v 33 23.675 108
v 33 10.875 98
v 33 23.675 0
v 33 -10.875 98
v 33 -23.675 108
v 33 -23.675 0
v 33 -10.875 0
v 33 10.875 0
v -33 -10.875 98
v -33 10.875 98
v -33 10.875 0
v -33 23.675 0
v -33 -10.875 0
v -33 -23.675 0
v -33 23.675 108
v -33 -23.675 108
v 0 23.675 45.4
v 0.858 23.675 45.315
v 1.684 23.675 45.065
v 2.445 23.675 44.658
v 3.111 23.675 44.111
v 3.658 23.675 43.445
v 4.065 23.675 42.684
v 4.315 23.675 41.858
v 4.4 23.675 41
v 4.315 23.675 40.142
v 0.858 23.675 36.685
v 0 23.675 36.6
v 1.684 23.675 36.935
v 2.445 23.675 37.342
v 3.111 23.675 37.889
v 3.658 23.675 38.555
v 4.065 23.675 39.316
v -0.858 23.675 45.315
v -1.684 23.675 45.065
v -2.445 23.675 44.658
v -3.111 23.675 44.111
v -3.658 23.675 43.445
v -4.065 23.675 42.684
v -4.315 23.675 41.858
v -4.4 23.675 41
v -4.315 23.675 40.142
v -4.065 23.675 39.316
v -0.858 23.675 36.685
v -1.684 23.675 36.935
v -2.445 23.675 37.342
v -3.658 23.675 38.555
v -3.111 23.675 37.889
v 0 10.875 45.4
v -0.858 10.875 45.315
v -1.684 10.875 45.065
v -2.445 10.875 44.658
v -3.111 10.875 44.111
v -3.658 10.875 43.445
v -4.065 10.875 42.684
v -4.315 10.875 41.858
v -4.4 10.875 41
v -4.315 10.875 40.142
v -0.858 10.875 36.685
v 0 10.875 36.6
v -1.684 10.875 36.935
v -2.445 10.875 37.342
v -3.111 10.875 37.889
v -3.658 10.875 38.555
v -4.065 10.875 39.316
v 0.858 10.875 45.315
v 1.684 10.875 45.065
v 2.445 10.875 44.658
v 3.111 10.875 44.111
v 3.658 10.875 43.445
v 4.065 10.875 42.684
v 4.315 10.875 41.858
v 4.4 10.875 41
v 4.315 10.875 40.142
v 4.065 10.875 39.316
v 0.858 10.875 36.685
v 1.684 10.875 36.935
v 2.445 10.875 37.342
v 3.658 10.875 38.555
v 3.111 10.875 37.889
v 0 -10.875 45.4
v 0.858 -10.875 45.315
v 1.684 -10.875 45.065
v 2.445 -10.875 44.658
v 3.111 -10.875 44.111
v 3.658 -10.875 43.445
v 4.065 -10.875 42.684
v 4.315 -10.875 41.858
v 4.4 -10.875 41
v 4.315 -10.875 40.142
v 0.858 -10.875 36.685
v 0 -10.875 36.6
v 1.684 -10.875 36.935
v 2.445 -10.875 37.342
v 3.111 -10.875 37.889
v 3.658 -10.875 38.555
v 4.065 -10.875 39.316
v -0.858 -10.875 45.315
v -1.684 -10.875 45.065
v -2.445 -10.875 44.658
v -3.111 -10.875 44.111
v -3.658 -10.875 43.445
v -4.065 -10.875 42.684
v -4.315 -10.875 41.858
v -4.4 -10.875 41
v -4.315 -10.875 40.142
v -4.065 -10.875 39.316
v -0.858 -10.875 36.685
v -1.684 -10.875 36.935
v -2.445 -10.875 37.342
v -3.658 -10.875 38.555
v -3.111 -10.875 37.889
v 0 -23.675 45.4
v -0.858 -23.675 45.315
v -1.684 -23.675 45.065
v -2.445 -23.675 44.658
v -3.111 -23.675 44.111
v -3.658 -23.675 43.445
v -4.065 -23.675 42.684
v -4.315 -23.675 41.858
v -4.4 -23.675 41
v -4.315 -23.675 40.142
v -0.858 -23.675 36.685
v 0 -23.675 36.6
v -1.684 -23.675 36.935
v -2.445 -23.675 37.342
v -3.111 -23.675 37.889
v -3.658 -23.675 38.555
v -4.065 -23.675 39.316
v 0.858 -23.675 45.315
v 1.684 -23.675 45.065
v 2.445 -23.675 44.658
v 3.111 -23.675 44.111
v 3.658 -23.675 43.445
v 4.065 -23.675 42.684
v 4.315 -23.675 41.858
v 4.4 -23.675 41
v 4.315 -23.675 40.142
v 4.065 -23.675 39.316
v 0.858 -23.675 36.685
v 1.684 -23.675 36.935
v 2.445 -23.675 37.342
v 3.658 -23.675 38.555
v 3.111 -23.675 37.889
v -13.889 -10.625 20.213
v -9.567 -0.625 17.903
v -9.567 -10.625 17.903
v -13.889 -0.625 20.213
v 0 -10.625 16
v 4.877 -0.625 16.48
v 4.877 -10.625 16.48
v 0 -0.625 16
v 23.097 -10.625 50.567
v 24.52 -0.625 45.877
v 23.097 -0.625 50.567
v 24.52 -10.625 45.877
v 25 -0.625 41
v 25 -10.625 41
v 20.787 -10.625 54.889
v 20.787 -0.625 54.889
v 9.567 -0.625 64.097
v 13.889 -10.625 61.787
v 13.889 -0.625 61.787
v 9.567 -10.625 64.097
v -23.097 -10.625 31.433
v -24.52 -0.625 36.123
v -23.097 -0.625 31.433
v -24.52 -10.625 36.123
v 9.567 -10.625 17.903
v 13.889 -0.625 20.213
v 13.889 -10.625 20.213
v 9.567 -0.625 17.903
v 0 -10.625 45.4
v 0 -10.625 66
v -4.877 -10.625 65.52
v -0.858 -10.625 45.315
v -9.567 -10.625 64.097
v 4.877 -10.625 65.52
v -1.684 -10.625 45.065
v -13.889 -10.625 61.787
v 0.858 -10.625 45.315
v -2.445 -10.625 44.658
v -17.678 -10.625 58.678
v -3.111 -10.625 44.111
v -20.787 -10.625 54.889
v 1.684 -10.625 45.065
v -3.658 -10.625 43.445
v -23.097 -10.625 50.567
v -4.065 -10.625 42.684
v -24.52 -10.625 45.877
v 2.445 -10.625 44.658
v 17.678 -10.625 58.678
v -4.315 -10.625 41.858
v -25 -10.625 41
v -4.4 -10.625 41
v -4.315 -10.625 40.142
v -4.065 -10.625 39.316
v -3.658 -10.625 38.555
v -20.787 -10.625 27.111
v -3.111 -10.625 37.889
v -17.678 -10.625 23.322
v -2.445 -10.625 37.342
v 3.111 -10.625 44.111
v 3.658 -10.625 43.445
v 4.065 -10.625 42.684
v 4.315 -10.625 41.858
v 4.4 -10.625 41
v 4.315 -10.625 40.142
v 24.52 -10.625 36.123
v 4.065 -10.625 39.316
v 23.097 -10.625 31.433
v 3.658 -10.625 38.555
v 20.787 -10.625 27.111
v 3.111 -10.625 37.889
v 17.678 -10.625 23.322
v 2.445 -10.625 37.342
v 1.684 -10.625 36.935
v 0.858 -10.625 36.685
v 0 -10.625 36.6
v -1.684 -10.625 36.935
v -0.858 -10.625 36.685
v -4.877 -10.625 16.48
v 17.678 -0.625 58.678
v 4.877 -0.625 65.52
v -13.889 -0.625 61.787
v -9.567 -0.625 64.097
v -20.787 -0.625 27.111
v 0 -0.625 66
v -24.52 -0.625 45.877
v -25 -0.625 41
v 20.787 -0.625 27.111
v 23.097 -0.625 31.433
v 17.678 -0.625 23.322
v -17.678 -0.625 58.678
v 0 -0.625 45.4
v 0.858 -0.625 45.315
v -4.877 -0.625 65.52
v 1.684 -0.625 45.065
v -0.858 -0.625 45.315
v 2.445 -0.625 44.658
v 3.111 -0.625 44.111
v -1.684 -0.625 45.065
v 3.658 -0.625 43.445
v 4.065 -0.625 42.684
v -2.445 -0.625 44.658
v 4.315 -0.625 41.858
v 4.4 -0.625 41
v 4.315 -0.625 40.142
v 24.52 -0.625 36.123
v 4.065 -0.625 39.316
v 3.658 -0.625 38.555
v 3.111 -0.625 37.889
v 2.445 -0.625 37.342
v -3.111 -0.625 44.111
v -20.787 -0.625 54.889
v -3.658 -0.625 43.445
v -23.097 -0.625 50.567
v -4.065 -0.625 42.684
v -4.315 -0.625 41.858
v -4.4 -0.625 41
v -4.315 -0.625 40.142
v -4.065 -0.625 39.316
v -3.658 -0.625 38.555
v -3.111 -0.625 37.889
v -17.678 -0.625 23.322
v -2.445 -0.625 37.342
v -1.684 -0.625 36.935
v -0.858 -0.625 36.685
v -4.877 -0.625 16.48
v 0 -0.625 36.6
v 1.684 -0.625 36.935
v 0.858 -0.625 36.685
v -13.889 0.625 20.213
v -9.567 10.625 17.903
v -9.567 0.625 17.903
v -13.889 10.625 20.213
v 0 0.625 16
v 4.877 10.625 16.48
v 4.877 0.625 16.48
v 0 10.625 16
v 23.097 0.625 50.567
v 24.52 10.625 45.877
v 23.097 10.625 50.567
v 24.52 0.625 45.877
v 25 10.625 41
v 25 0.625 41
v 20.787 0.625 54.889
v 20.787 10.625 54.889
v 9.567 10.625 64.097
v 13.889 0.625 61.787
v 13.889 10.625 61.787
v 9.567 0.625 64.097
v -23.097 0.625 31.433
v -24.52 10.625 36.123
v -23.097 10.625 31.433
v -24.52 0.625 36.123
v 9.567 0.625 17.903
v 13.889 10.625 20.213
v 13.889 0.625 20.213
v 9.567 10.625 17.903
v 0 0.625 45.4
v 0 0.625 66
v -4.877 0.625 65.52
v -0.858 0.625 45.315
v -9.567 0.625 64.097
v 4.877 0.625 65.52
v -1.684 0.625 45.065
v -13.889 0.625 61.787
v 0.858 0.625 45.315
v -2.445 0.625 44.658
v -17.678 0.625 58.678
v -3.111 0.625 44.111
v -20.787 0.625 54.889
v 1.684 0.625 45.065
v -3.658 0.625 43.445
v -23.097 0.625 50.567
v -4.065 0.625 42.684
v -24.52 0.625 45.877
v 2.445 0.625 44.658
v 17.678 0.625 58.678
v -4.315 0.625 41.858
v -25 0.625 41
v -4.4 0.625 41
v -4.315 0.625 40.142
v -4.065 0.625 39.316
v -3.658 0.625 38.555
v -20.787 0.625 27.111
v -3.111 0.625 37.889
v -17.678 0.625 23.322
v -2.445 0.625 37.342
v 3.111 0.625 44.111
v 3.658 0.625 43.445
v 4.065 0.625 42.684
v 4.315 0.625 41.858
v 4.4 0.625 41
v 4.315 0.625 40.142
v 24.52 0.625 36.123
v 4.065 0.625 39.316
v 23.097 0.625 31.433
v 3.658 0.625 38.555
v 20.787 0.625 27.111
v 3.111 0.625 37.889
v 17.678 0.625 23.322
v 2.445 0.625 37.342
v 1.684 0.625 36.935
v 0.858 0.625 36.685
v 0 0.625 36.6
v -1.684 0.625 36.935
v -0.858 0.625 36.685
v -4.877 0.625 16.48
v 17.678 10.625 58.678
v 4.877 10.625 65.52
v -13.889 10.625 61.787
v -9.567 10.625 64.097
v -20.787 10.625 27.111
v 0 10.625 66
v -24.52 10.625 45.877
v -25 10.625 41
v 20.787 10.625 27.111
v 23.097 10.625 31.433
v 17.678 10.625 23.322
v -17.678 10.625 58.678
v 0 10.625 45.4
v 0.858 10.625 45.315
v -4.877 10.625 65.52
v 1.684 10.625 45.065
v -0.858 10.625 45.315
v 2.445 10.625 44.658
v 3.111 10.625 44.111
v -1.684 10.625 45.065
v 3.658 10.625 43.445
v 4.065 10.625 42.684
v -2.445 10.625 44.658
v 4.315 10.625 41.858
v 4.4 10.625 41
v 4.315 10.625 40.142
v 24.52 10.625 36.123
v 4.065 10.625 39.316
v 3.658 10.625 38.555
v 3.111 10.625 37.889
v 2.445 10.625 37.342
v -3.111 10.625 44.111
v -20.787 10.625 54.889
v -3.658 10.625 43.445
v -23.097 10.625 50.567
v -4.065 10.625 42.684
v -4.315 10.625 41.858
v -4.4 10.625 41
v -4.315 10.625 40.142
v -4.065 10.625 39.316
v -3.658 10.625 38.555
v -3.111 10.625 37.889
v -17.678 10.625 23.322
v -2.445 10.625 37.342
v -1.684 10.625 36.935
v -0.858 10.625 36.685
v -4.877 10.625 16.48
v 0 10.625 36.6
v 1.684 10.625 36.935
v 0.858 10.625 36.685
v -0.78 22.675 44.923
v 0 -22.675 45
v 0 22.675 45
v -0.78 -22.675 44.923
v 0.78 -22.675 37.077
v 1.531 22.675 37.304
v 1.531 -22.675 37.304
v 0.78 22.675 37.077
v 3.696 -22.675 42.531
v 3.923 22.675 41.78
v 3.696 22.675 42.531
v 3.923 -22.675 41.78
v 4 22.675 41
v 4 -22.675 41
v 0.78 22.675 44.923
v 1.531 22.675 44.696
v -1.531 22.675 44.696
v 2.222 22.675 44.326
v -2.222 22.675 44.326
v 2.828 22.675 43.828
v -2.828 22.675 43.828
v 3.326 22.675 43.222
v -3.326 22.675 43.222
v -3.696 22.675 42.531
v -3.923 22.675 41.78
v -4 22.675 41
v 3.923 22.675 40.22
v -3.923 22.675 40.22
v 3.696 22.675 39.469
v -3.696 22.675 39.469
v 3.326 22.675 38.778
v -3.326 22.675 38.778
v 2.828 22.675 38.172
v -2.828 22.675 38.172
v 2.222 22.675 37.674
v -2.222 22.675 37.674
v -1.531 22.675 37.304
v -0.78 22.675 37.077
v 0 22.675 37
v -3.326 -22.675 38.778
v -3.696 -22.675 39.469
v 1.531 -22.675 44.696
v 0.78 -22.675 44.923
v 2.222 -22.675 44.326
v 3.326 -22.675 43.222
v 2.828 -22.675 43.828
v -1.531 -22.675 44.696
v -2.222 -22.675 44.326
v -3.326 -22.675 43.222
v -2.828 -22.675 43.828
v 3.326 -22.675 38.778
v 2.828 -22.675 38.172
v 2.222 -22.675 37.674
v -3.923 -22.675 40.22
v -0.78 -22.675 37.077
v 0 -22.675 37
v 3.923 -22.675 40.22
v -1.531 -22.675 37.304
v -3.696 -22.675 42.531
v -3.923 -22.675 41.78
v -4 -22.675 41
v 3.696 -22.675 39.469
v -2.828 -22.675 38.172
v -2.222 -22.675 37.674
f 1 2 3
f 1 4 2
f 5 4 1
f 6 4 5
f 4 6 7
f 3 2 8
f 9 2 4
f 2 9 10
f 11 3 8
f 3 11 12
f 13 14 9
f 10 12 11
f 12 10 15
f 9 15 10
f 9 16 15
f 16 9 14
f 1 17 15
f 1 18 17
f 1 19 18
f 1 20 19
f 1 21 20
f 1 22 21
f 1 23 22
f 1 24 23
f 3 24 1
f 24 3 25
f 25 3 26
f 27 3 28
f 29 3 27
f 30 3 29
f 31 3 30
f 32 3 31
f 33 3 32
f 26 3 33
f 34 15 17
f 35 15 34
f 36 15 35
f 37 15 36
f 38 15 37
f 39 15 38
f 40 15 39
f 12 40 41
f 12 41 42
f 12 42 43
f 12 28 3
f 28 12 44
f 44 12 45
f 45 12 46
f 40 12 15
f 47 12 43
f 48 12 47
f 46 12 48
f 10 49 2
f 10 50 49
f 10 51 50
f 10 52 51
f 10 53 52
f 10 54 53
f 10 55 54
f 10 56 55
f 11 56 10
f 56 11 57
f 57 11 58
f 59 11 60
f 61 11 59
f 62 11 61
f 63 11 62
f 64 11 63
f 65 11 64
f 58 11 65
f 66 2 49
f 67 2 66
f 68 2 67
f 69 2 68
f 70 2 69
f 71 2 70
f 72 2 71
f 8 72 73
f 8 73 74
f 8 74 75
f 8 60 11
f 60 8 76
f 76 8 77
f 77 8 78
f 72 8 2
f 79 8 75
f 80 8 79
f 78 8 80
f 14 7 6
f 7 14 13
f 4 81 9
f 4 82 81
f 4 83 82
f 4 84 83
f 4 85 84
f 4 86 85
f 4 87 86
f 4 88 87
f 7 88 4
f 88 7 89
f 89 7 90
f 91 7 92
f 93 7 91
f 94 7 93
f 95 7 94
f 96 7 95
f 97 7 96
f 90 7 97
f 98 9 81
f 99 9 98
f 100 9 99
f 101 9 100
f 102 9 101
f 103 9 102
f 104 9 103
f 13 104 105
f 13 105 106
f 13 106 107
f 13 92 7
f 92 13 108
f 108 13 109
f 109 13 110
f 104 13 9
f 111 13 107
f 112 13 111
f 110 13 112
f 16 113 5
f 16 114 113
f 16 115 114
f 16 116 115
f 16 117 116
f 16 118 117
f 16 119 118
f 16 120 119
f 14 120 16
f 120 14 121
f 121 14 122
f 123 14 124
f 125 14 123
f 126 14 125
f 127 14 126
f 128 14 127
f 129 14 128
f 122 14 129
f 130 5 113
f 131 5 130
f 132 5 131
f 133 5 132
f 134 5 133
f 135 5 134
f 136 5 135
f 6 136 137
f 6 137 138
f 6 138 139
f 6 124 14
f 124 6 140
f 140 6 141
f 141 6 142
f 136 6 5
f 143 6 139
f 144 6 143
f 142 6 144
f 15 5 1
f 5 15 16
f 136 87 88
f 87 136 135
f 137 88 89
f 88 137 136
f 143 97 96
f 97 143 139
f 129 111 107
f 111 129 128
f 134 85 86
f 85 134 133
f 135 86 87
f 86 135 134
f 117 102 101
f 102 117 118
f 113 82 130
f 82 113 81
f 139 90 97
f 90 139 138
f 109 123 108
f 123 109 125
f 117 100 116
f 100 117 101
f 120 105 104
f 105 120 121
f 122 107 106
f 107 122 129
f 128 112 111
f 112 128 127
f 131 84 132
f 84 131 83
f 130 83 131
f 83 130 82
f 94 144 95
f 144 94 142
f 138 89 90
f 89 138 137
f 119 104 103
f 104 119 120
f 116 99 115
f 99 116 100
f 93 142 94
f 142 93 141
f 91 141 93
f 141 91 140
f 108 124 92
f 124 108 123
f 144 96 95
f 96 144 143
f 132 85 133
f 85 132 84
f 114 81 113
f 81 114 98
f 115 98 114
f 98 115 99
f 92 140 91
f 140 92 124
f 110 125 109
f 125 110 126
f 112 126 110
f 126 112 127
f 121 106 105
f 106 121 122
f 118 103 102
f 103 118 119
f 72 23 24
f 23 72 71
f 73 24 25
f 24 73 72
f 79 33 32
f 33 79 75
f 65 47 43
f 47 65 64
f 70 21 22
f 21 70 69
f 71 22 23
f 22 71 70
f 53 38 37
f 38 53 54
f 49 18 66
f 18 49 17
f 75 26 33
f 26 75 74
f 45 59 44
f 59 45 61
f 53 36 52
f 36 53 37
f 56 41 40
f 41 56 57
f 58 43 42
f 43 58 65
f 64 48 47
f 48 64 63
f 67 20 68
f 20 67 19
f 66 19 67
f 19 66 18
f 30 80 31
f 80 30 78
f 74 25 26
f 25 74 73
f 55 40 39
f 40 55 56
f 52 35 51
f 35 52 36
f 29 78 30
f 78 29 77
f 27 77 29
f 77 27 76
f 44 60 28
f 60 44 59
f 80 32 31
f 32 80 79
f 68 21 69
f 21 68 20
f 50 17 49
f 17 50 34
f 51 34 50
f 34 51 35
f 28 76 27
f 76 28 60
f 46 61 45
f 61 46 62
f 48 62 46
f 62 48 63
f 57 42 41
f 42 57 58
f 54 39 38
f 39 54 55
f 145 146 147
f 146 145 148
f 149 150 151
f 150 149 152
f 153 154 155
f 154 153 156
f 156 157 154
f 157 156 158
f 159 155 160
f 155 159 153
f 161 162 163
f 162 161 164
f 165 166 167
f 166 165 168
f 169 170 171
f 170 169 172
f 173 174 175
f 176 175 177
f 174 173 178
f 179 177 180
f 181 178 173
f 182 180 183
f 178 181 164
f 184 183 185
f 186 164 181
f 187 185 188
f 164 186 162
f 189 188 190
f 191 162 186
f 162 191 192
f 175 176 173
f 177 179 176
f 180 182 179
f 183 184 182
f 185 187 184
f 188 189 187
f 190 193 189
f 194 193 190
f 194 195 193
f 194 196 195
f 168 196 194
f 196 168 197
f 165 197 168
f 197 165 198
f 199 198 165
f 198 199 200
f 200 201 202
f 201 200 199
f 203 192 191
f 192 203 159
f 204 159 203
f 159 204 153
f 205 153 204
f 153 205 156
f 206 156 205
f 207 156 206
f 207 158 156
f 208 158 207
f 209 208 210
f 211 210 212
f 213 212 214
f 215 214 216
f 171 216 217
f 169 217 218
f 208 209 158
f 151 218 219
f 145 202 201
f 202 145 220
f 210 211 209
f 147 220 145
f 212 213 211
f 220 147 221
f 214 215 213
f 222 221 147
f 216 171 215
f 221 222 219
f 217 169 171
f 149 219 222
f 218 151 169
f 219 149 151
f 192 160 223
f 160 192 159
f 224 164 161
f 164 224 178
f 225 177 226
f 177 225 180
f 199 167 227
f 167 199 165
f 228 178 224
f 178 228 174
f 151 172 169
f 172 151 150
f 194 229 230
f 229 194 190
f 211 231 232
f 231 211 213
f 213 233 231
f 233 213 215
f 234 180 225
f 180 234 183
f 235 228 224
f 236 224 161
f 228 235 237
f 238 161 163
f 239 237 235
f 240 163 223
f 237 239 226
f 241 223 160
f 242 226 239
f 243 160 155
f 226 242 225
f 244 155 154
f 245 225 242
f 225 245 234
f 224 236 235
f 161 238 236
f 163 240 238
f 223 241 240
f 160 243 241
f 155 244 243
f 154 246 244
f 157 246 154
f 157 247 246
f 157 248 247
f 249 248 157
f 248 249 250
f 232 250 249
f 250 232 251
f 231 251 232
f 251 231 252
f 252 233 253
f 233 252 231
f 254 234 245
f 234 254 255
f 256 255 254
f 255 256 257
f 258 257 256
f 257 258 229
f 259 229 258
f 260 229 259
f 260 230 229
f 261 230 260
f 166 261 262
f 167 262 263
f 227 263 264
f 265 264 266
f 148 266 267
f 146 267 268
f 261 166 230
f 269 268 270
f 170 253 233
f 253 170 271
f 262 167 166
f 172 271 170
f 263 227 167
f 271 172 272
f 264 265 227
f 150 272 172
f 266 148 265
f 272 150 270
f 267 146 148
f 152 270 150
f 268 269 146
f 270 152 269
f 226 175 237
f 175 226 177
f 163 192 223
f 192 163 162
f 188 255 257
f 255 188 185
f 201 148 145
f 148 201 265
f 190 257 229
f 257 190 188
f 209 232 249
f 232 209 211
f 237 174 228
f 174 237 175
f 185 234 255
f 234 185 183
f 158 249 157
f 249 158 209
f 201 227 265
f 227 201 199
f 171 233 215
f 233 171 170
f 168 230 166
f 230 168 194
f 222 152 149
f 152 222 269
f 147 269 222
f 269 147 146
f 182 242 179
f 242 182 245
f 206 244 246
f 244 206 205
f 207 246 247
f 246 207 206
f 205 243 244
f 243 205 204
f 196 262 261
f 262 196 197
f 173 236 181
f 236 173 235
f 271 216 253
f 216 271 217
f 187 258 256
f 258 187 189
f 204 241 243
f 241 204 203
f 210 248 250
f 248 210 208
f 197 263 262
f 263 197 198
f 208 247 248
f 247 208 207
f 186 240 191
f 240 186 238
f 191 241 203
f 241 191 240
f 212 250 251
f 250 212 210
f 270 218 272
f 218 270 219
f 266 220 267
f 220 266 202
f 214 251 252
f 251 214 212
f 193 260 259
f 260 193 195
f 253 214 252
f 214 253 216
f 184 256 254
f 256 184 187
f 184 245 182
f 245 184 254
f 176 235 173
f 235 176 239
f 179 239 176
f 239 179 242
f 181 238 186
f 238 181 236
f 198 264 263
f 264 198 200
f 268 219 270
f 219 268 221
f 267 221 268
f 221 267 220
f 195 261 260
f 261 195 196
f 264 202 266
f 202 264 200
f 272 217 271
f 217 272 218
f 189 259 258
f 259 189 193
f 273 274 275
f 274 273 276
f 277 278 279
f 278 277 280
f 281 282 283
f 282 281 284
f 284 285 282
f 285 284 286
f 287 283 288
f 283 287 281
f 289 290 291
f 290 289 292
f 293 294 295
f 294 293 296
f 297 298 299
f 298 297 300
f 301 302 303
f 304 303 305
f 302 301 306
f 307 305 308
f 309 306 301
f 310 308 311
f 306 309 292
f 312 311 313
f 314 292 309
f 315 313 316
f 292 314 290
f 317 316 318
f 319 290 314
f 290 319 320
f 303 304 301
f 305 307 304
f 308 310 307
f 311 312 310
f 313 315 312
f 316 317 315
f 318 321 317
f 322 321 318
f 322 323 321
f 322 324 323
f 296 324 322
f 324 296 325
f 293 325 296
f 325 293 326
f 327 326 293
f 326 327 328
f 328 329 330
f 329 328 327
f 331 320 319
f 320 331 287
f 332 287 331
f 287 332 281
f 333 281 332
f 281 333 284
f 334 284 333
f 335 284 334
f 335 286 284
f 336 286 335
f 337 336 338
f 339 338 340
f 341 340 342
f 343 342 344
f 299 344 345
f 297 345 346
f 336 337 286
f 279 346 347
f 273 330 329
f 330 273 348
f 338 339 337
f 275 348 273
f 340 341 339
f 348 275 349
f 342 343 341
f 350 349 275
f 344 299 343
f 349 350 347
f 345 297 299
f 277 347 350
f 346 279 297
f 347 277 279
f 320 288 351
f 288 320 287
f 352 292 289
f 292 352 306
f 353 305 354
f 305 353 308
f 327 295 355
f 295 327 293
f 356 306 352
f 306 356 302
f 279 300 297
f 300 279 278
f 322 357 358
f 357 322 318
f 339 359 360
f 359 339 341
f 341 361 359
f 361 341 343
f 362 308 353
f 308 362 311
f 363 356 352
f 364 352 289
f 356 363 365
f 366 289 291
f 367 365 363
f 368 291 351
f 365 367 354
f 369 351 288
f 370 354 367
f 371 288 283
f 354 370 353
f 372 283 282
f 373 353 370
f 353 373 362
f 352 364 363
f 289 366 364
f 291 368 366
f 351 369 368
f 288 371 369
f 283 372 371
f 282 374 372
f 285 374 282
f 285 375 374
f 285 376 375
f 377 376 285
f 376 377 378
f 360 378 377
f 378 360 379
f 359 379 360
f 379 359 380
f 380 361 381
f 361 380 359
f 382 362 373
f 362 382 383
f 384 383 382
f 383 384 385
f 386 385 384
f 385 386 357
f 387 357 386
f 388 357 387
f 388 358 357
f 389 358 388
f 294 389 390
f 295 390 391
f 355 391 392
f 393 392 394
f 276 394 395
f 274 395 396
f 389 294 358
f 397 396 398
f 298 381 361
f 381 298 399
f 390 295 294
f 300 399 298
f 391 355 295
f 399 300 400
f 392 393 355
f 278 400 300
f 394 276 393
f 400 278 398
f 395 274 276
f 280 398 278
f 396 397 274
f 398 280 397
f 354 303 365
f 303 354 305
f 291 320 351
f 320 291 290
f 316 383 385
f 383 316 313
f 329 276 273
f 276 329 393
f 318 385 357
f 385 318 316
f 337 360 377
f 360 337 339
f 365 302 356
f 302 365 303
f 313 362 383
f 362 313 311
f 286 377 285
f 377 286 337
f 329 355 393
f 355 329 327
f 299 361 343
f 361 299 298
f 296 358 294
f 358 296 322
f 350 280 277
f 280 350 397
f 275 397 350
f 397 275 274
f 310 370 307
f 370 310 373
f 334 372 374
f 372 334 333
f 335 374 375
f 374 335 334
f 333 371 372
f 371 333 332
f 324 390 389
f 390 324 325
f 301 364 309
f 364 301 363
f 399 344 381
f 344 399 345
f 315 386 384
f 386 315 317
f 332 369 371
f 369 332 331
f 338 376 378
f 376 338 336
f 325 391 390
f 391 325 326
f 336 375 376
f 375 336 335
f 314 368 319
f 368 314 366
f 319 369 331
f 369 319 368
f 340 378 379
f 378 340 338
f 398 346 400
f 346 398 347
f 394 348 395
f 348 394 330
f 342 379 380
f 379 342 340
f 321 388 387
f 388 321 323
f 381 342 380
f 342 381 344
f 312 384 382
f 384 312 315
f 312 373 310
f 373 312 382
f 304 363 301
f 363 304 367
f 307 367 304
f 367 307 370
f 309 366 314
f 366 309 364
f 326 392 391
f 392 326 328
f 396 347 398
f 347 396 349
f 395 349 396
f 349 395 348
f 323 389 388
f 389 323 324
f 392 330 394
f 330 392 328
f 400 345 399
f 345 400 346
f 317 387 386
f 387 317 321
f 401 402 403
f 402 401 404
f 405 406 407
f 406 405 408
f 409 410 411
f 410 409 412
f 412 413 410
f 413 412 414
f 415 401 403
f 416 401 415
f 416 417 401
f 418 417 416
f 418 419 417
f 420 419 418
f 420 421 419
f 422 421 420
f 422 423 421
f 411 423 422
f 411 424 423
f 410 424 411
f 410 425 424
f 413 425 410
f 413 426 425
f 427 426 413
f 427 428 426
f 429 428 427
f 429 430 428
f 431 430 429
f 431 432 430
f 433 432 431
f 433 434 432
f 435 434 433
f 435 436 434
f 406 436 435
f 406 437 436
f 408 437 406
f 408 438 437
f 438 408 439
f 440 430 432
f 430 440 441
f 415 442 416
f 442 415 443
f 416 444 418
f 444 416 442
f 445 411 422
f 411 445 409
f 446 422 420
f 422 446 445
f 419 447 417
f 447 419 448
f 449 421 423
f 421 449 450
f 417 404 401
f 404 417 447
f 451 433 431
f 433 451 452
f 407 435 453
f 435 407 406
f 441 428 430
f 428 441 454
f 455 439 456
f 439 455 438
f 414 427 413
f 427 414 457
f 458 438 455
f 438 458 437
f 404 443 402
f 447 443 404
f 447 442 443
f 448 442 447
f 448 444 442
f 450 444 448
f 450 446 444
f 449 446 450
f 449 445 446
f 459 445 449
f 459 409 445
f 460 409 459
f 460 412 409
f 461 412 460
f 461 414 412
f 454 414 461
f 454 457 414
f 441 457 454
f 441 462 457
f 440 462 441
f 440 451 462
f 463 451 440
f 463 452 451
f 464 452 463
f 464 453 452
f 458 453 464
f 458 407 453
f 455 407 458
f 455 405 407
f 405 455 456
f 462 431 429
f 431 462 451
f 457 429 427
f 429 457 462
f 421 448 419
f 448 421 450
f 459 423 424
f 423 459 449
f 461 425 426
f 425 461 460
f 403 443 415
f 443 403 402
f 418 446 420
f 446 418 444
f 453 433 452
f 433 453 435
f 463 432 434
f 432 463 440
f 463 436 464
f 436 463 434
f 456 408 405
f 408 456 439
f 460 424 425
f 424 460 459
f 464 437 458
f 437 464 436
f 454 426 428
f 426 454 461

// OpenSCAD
$fn = 32;

// ------------------------------------------------------------------------
// Trolley wheel set: wheels d50, fork 98 mm tall
// Every part is its own module, assembly() places every instance.
// ------------------------------------------------------------------------

// --- part 1 ---
module trolley_fork() {
  difference() {
    union() {
      translate([-33, 10.875, 0]) cube([66, 12.8, 98]);
      translate([-33, -23.675, 0]) cube([66, 12.8, 98]);
      translate([-33, -23.675, 98]) cube([66, 47.35, 10]);
    }
    translate([0, -17.275, 41]) rotate([90, 0, 0]) cylinder(h = 14.8, d = 8.8, center = true);
    translate([0, 17.275, 41]) rotate([90, 0, 0]) cylinder(h = 14.8, d = 8.8, center = true);
  }
}

// --- part 2 ---
module trolley_wheel() {
  difference() {
      translate([0, 0, 0]) cylinder(h = 10, d = 50);
      translate([0, 0, -1]) cylinder(h = 12, d = 8.8);
    }
}

// --- part 3 ---
module trolley_axle() {
  translate([0, 0, -22.675]) cylinder(h = 45.35, d = 8);
}

// --- assembly ---
module assembly() {
  color([0.80, 0.24, 0.20]) translate([0, 0, 0]) rotate([0, 0, 0]) trolley_fork();
  color([0.20, 0.45, 0.75]) translate([0, -0.625, 41]) rotate([90, 0, 0]) trolley_wheel();
  color([0.25, 0.62, 0.32]) translate([0, 10.625, 41]) rotate([90, 0, 0]) trolley_wheel();
  color([0.92, 0.70, 0.18]) translate([0, 0, 41]) rotate([90, 0, 0]) trolley_axle();
}

assembly();
